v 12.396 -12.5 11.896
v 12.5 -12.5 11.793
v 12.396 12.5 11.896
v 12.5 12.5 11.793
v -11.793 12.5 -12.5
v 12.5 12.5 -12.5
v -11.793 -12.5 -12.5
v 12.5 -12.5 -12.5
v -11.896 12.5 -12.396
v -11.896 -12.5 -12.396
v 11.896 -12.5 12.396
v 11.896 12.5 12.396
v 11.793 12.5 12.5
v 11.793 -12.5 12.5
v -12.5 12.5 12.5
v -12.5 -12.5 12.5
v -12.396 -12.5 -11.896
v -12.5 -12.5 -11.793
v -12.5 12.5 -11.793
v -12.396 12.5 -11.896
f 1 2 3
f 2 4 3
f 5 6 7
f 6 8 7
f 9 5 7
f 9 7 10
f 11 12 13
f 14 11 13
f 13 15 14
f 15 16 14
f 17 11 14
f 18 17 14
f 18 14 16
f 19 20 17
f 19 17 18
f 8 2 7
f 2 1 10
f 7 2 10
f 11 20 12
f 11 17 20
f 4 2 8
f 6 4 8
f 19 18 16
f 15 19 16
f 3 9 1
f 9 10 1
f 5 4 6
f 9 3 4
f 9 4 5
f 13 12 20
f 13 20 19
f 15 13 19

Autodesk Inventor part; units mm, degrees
ref_plane "YZ Plane" through (0, 0, 0) normal (1, 0, 0) x (0, 1, 0)
ref_plane "XZ Plane" through (0, 0, 0) normal (0, 1, 0) x (-1, 0, 0)
ref_plane "XY Plane" through (0, 0, 0) normal (0, 0, 1) x (1, 0, 0)
sketch "Sketch1" plane through (0, 0, 0) normal (0, 1, 0) x (-1, 0, 0)
  line L0 (-12.5, 12) -> (-12.5, -12.5)
  line L1 (-12.5, -12.5) -> (12, -12.5)
  line L2 (12.5, -12) -> (12.5, 12.5)
  line L3 (12.5, 12.5) -> (-12, 12.5)
  line L4 (-12.5, 12.5) -> (12.5, -12.5) construction
  line L5 (-12.5, -12.5) -> (12.5, 12.5) construction
  line L6 (12, -12.5) -> (-12.5, 12)
  line L7 (12.5, -12) -> (-12, 12.5)
  point P0 (0, 0)
  point P1 (0, 0)
  point P2 (0, 0)
  dimension "d13" = 1
  dimension "d14" = 2
  dimension "d15" = 0.3535
  dimension "d0" = 25
  dimension "d1" = 25
  dimension "d2" = 0.5
  dimension "d3" = 0.5
  dimension "d4" = 0.5
  dimension "d5" = 0.7071
  dimension "d6" = 17.6777
  dimension "d7" = 17.6777
  dimension "d8" = 24.5
extrude "Extrusion1" add sketch "Sketch1" along normal mid plane 25
sketch "Sketch3" plane through (0, 12.5, 0) normal (0, 1, 0) x (1, 0, 0)
  line L0 (-13.9142, 13.2071) -> (-13.2071, 13.9142)
  line L1 (-13.2071, 13.9142) -> (-11.7929, 12.5)
  line L2 (-11.7929, 12.5) -> (-12.5, 11.7929)
  line L3 (-12.5, 11.7929) -> (-13.9142, 13.2071)
  line L4 (-13.9142, 13.2071) -> (-11.7929, 12.5) construction
  line L5 (-13.2071, 13.9142) -> (-12.5, 11.7929) construction
  line L6 (12, -12.5) -> (-12.5, 12) projected
  line L7 (-12.5, 12) -> (-12.5, -12.5) projected
  line L8 (13.2071, -13.9142) -> (13.9142, -13.2071)
  line L9 (13.9142, -13.2071) -> (12.5, -11.7929)
  line L10 (12.5, -11.7929) -> (11.7929, -12.5)
  line L11 (11.7929, -12.5) -> (13.2071, -13.9142)
  line L12 (13.2071, -13.9142) -> (12.5, -11.7929) construction
  line L13 (13.9142, -13.2071) -> (11.7929, -12.5) construction
  line L14 (-12, 12.5) -> (12.5, -12) projected
  line L15 (-12.5, -12.5) -> (12, -12.5) projected
  line L16 (12.5, -12) -> (12.5, 12.5) projected
  point P0 (0, 0)
  point P1 (-12.8536, 12.8536)
  point P2 (-12.8536, 12.8536)
  point P3 (12.8536, -12.8536)
  point P4 (12.8536, -12.8536)
  dimension "d13" = 1
  dimension "d14" = 2
  dimension "d15" = 0.3535
  dimension "d16" = 1
  dimension "d17" = 0.3535
  dimension "d18" = 2
extrude "Extrusion3" cut sketch "Sketch3" against normal through all contours L0 L1 L2 L6 L7 L3 | L7 L6 L2 | L10 L14 L16 L9 L8 L11 L15 L6 | L6 L15 L10 | L10 L16 L14
properties part number "Beamsplittertransparent"
